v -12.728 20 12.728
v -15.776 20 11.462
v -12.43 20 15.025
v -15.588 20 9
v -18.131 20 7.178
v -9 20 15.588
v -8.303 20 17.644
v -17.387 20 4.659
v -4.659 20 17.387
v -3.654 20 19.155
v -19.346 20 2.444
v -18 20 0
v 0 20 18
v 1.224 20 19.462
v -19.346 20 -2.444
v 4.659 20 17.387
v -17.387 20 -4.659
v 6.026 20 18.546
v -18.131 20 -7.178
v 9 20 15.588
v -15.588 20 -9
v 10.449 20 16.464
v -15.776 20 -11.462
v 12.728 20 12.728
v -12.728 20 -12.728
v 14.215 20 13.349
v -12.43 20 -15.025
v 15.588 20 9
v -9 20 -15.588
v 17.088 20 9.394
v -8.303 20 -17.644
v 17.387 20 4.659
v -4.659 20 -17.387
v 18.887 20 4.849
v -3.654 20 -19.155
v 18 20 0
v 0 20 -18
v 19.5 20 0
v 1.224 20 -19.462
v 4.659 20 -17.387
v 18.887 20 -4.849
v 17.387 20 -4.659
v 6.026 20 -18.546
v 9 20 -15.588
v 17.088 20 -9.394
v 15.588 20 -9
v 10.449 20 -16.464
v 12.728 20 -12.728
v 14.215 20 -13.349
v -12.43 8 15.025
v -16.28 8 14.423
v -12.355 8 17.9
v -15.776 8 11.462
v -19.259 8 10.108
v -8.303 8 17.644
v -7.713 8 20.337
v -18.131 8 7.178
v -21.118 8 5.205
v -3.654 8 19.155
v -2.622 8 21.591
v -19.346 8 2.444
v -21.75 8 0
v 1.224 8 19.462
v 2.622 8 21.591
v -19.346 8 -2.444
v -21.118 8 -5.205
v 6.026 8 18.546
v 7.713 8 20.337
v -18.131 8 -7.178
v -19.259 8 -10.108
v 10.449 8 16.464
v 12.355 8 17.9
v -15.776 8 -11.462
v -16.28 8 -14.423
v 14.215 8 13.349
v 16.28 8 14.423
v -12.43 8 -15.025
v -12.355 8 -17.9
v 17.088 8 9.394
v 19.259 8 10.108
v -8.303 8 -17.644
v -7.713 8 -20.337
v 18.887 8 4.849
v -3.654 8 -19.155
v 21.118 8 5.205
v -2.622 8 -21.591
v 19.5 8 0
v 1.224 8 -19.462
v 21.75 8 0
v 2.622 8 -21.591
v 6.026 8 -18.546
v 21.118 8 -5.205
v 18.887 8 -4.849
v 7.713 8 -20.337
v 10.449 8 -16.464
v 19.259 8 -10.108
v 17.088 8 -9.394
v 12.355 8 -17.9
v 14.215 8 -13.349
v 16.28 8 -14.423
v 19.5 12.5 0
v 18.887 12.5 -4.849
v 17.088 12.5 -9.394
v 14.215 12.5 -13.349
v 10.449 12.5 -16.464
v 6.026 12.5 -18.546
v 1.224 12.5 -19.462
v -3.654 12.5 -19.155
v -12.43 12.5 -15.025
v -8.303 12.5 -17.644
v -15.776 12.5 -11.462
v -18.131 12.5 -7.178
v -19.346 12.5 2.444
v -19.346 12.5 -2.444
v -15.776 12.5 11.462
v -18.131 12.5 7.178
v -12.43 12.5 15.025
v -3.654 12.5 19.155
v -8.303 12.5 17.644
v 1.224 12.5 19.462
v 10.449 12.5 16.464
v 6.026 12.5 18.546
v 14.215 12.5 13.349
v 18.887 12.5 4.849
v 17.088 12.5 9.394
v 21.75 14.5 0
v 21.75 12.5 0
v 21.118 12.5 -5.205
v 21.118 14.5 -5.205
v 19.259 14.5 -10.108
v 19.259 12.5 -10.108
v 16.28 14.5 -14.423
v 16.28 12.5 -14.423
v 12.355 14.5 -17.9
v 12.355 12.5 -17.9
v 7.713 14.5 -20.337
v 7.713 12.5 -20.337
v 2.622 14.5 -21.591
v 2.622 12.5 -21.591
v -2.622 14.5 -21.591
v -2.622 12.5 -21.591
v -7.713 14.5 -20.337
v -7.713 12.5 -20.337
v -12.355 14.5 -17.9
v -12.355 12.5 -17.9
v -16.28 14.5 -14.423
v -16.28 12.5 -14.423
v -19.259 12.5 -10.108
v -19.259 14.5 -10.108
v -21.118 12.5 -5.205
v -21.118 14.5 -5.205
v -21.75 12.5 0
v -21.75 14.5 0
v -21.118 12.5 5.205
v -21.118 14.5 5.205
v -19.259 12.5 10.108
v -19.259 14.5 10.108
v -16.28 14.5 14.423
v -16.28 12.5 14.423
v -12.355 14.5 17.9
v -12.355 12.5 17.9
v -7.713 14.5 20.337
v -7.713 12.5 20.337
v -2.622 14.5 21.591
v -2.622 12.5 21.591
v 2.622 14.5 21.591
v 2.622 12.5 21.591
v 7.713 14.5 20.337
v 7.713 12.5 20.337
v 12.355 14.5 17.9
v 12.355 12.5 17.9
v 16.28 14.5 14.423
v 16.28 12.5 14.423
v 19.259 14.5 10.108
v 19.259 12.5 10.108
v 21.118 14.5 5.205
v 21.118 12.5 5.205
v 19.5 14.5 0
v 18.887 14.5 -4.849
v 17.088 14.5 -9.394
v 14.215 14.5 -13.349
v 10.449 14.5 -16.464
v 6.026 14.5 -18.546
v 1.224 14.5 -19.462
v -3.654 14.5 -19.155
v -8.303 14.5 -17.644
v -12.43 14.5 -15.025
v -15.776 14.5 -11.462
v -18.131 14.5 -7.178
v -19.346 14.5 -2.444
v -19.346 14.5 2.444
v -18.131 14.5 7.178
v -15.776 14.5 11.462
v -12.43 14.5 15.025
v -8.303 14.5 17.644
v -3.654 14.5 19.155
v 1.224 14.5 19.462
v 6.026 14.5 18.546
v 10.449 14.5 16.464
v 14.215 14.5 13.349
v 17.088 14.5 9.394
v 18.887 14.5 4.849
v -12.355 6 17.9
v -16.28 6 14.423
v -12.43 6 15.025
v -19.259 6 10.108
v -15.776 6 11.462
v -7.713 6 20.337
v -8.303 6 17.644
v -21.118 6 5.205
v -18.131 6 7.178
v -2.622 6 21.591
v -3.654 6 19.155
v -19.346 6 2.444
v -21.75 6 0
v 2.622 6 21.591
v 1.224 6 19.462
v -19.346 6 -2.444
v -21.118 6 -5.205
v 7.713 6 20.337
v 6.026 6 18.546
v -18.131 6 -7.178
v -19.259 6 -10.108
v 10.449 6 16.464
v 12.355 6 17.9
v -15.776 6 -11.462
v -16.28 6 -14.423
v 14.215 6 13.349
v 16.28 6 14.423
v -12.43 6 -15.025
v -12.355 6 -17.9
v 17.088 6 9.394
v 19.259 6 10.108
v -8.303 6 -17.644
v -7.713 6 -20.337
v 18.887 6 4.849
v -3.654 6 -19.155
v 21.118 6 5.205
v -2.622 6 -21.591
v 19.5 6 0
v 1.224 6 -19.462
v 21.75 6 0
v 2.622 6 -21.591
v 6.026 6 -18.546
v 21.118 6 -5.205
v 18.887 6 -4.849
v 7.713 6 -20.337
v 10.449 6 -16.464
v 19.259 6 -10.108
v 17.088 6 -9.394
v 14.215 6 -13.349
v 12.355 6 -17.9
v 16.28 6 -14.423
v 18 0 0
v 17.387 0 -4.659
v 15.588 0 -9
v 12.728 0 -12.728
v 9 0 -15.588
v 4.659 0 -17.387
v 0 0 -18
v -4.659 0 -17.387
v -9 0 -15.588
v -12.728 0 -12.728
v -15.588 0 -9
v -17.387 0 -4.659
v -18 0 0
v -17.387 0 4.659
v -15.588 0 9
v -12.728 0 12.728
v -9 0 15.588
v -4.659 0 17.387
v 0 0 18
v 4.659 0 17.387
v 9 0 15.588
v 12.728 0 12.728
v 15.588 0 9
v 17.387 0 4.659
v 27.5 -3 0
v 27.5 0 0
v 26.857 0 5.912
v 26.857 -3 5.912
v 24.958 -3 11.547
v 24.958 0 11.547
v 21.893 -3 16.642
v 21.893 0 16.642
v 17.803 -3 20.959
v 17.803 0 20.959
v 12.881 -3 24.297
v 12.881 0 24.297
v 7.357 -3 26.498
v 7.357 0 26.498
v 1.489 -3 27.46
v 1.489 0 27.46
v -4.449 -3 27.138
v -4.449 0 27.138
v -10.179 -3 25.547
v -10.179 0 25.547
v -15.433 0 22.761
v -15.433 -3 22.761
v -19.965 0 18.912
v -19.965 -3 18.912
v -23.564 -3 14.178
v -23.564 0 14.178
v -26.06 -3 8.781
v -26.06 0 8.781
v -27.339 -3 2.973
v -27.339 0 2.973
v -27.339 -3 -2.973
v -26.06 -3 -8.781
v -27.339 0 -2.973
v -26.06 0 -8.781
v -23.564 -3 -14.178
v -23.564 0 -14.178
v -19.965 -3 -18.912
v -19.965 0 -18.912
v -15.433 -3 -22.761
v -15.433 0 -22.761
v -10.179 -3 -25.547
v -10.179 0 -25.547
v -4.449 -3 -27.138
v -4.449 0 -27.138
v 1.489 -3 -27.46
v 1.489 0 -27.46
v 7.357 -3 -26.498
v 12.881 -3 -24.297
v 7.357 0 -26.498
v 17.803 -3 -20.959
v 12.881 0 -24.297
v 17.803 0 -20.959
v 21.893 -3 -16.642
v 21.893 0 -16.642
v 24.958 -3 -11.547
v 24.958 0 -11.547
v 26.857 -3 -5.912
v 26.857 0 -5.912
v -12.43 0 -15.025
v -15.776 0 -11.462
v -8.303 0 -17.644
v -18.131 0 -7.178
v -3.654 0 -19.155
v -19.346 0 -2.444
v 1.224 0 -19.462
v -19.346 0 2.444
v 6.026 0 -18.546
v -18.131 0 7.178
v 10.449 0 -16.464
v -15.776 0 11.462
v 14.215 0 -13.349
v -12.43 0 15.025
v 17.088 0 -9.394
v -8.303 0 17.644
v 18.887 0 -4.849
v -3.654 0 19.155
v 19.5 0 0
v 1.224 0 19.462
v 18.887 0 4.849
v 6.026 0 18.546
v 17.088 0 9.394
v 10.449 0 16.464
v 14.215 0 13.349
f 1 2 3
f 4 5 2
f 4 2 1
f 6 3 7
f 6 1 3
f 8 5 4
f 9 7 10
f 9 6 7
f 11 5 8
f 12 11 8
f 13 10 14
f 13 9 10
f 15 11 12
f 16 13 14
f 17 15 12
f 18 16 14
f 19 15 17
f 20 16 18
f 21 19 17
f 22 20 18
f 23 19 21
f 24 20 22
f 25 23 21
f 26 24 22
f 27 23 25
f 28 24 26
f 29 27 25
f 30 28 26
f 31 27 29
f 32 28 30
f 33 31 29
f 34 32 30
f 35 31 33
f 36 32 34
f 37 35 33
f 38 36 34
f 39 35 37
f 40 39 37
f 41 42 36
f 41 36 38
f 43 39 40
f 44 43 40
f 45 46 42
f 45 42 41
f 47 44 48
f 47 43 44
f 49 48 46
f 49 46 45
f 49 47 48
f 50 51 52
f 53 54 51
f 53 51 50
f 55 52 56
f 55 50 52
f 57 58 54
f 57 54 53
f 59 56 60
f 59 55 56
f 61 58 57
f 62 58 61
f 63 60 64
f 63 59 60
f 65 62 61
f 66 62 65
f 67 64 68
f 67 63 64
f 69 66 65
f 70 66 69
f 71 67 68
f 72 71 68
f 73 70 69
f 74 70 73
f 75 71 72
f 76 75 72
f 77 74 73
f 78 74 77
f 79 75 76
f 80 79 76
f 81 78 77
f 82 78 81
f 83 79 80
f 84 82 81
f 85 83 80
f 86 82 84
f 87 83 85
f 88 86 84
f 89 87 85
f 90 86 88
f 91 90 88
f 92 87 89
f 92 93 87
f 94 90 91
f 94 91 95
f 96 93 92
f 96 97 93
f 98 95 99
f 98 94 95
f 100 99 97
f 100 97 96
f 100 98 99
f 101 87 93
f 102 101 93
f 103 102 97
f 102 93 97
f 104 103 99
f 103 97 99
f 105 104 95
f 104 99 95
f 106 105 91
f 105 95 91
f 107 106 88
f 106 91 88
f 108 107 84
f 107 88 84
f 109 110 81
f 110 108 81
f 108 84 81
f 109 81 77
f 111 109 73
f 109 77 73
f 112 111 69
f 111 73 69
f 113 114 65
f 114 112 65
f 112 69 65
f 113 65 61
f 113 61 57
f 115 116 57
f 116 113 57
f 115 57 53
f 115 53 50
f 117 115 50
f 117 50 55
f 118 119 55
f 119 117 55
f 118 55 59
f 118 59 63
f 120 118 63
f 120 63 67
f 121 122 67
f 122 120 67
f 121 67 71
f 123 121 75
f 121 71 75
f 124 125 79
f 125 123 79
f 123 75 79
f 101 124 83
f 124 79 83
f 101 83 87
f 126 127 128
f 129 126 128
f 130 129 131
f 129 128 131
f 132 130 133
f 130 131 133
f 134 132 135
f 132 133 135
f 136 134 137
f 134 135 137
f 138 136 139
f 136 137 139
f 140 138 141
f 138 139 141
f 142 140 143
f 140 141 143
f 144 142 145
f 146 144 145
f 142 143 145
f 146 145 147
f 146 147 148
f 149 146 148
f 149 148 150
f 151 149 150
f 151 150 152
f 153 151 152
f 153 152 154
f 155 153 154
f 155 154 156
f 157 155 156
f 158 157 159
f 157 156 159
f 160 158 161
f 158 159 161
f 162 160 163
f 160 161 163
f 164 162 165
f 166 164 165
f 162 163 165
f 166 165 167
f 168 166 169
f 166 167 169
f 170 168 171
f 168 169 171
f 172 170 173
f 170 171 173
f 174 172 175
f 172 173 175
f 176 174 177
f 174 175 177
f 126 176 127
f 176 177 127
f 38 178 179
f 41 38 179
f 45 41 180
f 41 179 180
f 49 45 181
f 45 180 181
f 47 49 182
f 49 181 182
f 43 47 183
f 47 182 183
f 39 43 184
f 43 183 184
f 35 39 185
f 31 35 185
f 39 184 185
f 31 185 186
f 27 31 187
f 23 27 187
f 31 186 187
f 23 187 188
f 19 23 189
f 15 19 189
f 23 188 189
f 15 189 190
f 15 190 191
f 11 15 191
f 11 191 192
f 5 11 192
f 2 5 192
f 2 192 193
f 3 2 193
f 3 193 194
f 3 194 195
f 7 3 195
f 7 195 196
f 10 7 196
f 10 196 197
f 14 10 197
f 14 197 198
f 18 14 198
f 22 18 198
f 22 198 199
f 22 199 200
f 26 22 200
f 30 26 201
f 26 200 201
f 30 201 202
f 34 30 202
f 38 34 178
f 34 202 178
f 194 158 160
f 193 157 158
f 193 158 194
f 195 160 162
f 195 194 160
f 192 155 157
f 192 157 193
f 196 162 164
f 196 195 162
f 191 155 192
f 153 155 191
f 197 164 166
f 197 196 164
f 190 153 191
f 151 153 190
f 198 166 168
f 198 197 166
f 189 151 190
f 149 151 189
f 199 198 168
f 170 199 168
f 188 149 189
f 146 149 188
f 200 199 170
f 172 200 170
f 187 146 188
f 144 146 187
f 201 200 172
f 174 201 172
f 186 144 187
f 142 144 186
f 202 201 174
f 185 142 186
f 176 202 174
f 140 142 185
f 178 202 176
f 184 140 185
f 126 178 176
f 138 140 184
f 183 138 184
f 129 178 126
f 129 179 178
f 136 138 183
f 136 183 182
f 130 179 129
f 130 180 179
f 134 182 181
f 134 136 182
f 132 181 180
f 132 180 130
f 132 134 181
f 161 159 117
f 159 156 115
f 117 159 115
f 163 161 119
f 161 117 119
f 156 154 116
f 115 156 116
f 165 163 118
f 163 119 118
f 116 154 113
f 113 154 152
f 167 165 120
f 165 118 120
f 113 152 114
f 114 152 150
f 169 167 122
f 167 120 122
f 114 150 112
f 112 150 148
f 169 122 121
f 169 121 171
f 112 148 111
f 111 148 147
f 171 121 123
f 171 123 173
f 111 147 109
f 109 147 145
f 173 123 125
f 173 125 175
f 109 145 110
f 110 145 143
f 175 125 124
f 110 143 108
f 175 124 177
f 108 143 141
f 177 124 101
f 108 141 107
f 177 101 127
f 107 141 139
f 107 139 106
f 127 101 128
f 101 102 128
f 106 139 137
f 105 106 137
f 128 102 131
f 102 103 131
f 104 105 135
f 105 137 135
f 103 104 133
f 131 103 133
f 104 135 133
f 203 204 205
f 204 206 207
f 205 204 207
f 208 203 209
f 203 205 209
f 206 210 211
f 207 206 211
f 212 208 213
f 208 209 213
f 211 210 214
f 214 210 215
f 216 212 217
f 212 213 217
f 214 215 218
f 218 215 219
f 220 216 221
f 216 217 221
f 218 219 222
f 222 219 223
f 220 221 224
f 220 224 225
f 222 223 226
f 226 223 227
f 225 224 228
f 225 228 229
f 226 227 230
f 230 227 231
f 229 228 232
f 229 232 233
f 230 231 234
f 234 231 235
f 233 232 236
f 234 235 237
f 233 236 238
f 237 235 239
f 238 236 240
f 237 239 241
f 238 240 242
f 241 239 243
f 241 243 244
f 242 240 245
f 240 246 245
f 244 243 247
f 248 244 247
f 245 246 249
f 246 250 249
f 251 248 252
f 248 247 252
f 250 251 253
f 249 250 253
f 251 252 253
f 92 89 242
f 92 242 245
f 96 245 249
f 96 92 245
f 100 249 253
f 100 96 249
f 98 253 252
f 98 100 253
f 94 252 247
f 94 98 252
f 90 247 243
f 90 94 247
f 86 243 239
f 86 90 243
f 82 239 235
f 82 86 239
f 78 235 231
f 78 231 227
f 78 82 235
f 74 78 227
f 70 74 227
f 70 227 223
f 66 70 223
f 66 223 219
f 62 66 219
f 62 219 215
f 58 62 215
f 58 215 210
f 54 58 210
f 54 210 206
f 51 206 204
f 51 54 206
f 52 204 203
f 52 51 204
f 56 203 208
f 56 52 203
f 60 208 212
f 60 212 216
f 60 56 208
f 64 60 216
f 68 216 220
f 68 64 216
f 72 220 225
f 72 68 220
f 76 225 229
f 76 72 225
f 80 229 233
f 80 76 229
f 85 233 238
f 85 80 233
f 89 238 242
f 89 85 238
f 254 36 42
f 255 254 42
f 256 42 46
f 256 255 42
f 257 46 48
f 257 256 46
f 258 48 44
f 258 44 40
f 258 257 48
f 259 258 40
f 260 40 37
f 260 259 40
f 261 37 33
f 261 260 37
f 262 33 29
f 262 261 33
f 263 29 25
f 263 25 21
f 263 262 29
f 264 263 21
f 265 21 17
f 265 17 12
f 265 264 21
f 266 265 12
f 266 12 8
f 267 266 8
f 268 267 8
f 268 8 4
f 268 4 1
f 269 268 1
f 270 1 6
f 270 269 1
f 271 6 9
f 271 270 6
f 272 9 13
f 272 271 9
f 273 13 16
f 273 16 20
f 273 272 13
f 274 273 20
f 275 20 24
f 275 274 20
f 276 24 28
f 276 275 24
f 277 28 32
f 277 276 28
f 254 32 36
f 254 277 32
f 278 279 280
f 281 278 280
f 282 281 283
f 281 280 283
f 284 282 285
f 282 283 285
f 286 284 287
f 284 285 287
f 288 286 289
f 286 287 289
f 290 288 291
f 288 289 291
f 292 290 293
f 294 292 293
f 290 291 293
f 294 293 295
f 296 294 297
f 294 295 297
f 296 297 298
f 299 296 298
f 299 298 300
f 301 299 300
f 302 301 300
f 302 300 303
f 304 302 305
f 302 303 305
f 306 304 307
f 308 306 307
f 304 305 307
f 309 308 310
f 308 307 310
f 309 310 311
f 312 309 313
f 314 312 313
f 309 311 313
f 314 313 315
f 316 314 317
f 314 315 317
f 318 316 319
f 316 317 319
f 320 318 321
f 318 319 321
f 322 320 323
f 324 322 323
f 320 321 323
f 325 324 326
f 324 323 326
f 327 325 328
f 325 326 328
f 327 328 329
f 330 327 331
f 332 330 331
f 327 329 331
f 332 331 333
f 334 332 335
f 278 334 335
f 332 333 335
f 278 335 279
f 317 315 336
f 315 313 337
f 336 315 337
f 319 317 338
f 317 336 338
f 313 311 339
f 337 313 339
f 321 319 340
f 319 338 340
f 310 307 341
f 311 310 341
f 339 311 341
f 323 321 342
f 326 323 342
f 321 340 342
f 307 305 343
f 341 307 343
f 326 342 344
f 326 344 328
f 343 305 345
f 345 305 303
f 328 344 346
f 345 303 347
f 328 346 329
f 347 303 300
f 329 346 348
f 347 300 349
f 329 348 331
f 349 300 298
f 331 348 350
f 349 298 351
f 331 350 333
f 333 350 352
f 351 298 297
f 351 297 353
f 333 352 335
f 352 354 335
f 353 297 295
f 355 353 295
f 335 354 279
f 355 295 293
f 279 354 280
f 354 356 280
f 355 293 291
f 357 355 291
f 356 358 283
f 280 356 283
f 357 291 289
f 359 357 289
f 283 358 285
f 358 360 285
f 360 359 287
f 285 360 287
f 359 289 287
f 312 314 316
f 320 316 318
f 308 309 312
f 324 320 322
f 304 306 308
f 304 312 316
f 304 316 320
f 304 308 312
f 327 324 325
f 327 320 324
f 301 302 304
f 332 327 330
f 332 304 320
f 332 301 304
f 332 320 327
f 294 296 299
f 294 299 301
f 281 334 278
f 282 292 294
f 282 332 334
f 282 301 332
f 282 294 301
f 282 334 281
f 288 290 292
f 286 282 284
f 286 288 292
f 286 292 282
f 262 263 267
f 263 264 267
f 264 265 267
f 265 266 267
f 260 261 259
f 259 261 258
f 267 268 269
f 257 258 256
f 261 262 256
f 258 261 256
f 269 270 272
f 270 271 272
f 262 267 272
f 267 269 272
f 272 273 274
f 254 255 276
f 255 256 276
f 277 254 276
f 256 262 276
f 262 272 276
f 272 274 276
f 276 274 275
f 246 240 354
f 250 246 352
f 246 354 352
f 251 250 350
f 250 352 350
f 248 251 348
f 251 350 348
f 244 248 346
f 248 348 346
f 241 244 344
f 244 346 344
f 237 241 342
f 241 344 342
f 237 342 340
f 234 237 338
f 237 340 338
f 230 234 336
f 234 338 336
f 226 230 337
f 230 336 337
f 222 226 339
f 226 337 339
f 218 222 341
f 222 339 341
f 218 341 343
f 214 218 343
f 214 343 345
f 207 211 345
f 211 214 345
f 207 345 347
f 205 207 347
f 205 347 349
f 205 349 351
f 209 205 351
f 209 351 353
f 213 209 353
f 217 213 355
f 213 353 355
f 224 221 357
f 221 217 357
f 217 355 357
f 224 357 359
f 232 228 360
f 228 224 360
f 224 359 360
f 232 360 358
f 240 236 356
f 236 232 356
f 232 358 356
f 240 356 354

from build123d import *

# Parameters (mm, degrees)
SKETCH_1_R          = 19.5
SKETCH_1_R_2        = 18
EXTRUDE_1_DEPTH     = 20
SKETCH_3_R          = 27.5
EXTRUDE_2_DEPTH     = 3
SKETCH_4_R          = 21.75
EXTRUDE_3_DEPTH     = 2
EXTRUDE_START       = 1
SKETCH_8_R          = 21.75
EXTRUDE_4_DEPTH     = 2
SKETCH_6_R          = 18
CUT_EXTRUDE_1_DEPTH = 35


with BuildPart() as part:
    # 草圖1 → 填料-伸長1 (new body)
    with BuildSketch(Plane(origin=(0, 0, 0), x_dir=(1, 0, 0), z_dir=(0, 1, 0))):
        Circle(SKETCH_1_R)
        Circle(SKETCH_1_R_2, mode=Mode.SUBTRACT)
    extrude(amount=EXTRUDE_1_DEPTH)

    # 草圖3 → 填料-伸長2 (add)
    with BuildSketch(Plane.XZ):
        Circle(SKETCH_3_R)
    extrude(amount=EXTRUDE_2_DEPTH)

    # 草圖4 → 填料-伸長3 (add)
    with BuildSketch(Plane(origin=(0, 8, 0), x_dir=(1, 0, 0), z_dir=(0, 1, 0))):
        Circle(SKETCH_4_R)
    extrude(amount=-EXTRUDE_3_DEPTH)

    # 草圖8 → 填料-伸長4 (add)
    with BuildSketch(Plane(origin=(0, 11.5, 0), x_dir=(1, 0, 0), z_dir=(0, 1, 0)).offset(EXTRUDE_START)):
        Circle(SKETCH_8_R)
    extrude(amount=EXTRUDE_4_DEPTH)

    # 草圖6 → 除料-伸長1 (cut)
    with BuildSketch(Plane(origin=(0, 0, 0), x_dir=(1, 0, 0), z_dir=(0, 1, 0))):
        Circle(SKETCH_6_R)
    extrude(amount=CUT_EXTRUDE_1_DEPTH, mode=Mode.SUBTRACT)


solid = part.part
